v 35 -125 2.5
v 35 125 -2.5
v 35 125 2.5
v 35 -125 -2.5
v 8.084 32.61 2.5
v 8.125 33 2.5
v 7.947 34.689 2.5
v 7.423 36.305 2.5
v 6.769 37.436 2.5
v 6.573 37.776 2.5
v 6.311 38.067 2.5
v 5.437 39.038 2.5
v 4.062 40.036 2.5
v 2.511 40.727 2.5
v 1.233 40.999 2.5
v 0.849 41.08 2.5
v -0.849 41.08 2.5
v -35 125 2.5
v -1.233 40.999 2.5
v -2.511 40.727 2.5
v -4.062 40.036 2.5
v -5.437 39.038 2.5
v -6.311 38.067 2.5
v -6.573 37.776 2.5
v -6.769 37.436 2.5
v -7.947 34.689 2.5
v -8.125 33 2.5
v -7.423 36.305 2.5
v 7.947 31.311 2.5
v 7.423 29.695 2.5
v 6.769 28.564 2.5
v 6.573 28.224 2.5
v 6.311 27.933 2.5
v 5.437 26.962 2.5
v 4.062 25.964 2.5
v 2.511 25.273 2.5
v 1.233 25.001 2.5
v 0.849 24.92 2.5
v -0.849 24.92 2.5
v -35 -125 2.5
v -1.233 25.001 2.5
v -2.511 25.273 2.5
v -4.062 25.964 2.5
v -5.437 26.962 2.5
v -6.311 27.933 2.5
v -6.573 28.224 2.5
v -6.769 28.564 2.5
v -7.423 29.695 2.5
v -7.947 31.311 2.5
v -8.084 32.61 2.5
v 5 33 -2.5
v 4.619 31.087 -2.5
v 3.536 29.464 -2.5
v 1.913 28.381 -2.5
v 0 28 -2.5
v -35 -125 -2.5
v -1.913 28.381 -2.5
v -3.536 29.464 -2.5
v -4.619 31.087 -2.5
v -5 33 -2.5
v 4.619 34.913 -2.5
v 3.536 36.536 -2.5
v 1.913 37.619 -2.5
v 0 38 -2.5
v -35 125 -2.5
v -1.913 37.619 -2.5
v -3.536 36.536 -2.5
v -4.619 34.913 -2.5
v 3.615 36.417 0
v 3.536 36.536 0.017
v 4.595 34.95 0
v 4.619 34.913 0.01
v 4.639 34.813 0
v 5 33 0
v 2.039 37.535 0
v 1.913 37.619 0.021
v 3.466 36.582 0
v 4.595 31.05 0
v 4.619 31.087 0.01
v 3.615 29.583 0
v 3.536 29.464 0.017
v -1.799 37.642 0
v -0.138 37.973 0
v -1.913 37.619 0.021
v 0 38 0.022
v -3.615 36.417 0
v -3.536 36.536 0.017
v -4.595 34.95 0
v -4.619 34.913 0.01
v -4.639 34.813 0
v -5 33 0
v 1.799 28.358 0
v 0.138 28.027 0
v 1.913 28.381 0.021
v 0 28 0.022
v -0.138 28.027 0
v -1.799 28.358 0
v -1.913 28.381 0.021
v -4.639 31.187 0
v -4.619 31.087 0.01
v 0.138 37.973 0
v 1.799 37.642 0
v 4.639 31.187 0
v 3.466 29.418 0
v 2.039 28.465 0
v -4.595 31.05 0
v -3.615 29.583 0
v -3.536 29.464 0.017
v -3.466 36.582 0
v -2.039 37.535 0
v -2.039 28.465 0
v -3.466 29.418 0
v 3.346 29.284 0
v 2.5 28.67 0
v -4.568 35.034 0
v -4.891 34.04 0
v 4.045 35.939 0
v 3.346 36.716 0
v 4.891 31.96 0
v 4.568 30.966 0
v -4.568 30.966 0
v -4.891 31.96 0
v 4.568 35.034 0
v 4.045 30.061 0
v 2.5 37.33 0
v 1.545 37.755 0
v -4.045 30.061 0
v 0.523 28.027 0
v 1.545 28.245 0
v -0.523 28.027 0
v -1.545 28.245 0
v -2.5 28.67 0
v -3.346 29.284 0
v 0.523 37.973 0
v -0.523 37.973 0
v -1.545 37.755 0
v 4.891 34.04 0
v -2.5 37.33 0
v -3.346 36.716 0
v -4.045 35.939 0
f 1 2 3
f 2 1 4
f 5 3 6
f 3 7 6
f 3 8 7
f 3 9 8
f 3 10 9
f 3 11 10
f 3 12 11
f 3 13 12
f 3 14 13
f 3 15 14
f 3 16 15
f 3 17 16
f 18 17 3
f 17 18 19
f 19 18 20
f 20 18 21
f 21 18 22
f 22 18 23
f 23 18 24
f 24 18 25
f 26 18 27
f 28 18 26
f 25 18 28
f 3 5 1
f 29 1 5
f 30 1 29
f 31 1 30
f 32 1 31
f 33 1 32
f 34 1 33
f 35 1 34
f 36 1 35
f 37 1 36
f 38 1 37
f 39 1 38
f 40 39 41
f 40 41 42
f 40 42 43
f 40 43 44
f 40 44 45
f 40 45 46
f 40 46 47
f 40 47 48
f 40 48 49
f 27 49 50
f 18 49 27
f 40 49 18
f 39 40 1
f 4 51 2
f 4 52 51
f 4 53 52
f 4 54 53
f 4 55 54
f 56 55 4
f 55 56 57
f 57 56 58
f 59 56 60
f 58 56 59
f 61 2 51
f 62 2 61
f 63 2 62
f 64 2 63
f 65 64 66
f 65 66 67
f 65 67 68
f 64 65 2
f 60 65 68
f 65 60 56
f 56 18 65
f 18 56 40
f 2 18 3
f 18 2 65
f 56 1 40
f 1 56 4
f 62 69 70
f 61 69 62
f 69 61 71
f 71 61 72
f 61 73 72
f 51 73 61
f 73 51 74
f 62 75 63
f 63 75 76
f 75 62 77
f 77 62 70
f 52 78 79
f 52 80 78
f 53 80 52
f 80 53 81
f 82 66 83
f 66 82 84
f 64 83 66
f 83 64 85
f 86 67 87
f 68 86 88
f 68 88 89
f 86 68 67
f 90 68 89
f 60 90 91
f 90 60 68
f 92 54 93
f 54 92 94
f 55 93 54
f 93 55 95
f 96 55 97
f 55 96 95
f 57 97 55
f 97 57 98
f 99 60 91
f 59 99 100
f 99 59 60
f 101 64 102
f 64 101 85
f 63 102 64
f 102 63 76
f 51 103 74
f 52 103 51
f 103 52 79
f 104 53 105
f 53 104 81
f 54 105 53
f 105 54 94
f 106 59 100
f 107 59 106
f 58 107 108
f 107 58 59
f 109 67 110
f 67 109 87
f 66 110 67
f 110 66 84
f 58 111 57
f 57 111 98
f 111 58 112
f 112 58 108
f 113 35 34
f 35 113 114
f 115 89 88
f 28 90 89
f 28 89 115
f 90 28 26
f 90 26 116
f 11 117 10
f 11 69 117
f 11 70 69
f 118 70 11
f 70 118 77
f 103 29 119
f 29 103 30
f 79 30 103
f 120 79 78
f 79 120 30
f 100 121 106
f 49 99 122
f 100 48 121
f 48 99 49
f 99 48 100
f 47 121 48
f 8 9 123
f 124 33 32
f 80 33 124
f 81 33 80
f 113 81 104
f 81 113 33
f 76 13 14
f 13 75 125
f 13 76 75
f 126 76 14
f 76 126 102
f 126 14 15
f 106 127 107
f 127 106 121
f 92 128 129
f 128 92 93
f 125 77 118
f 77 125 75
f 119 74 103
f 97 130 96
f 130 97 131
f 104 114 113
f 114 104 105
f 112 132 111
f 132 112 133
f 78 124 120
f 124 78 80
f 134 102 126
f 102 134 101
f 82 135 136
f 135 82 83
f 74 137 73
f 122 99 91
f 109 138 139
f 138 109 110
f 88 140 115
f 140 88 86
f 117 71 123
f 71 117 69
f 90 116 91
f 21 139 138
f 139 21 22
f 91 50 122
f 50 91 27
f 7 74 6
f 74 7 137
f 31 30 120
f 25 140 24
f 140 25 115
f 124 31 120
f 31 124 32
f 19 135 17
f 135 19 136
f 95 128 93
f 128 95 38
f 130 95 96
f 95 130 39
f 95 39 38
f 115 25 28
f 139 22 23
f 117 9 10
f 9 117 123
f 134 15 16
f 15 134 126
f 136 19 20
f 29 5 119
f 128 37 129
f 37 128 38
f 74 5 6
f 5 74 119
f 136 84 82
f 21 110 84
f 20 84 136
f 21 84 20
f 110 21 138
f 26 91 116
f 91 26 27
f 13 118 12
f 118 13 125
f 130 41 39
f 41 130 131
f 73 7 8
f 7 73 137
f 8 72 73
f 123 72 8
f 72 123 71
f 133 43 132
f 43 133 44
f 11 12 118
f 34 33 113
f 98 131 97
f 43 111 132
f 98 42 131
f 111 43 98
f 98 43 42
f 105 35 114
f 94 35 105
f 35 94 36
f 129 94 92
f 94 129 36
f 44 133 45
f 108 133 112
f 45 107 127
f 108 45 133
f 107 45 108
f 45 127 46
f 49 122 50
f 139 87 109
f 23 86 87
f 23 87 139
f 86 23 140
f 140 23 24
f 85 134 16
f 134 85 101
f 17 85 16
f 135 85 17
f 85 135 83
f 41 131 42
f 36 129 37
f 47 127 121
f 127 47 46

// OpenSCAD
//Bottom
difference(){
    cube([70,250,5],true);

    translate([0,33,-5])
        cylinder(h=10, r1=5, r2=5);
    
    translate([0,33,0])
        cylinder(h=4, r1=5, r2=10);
    }
